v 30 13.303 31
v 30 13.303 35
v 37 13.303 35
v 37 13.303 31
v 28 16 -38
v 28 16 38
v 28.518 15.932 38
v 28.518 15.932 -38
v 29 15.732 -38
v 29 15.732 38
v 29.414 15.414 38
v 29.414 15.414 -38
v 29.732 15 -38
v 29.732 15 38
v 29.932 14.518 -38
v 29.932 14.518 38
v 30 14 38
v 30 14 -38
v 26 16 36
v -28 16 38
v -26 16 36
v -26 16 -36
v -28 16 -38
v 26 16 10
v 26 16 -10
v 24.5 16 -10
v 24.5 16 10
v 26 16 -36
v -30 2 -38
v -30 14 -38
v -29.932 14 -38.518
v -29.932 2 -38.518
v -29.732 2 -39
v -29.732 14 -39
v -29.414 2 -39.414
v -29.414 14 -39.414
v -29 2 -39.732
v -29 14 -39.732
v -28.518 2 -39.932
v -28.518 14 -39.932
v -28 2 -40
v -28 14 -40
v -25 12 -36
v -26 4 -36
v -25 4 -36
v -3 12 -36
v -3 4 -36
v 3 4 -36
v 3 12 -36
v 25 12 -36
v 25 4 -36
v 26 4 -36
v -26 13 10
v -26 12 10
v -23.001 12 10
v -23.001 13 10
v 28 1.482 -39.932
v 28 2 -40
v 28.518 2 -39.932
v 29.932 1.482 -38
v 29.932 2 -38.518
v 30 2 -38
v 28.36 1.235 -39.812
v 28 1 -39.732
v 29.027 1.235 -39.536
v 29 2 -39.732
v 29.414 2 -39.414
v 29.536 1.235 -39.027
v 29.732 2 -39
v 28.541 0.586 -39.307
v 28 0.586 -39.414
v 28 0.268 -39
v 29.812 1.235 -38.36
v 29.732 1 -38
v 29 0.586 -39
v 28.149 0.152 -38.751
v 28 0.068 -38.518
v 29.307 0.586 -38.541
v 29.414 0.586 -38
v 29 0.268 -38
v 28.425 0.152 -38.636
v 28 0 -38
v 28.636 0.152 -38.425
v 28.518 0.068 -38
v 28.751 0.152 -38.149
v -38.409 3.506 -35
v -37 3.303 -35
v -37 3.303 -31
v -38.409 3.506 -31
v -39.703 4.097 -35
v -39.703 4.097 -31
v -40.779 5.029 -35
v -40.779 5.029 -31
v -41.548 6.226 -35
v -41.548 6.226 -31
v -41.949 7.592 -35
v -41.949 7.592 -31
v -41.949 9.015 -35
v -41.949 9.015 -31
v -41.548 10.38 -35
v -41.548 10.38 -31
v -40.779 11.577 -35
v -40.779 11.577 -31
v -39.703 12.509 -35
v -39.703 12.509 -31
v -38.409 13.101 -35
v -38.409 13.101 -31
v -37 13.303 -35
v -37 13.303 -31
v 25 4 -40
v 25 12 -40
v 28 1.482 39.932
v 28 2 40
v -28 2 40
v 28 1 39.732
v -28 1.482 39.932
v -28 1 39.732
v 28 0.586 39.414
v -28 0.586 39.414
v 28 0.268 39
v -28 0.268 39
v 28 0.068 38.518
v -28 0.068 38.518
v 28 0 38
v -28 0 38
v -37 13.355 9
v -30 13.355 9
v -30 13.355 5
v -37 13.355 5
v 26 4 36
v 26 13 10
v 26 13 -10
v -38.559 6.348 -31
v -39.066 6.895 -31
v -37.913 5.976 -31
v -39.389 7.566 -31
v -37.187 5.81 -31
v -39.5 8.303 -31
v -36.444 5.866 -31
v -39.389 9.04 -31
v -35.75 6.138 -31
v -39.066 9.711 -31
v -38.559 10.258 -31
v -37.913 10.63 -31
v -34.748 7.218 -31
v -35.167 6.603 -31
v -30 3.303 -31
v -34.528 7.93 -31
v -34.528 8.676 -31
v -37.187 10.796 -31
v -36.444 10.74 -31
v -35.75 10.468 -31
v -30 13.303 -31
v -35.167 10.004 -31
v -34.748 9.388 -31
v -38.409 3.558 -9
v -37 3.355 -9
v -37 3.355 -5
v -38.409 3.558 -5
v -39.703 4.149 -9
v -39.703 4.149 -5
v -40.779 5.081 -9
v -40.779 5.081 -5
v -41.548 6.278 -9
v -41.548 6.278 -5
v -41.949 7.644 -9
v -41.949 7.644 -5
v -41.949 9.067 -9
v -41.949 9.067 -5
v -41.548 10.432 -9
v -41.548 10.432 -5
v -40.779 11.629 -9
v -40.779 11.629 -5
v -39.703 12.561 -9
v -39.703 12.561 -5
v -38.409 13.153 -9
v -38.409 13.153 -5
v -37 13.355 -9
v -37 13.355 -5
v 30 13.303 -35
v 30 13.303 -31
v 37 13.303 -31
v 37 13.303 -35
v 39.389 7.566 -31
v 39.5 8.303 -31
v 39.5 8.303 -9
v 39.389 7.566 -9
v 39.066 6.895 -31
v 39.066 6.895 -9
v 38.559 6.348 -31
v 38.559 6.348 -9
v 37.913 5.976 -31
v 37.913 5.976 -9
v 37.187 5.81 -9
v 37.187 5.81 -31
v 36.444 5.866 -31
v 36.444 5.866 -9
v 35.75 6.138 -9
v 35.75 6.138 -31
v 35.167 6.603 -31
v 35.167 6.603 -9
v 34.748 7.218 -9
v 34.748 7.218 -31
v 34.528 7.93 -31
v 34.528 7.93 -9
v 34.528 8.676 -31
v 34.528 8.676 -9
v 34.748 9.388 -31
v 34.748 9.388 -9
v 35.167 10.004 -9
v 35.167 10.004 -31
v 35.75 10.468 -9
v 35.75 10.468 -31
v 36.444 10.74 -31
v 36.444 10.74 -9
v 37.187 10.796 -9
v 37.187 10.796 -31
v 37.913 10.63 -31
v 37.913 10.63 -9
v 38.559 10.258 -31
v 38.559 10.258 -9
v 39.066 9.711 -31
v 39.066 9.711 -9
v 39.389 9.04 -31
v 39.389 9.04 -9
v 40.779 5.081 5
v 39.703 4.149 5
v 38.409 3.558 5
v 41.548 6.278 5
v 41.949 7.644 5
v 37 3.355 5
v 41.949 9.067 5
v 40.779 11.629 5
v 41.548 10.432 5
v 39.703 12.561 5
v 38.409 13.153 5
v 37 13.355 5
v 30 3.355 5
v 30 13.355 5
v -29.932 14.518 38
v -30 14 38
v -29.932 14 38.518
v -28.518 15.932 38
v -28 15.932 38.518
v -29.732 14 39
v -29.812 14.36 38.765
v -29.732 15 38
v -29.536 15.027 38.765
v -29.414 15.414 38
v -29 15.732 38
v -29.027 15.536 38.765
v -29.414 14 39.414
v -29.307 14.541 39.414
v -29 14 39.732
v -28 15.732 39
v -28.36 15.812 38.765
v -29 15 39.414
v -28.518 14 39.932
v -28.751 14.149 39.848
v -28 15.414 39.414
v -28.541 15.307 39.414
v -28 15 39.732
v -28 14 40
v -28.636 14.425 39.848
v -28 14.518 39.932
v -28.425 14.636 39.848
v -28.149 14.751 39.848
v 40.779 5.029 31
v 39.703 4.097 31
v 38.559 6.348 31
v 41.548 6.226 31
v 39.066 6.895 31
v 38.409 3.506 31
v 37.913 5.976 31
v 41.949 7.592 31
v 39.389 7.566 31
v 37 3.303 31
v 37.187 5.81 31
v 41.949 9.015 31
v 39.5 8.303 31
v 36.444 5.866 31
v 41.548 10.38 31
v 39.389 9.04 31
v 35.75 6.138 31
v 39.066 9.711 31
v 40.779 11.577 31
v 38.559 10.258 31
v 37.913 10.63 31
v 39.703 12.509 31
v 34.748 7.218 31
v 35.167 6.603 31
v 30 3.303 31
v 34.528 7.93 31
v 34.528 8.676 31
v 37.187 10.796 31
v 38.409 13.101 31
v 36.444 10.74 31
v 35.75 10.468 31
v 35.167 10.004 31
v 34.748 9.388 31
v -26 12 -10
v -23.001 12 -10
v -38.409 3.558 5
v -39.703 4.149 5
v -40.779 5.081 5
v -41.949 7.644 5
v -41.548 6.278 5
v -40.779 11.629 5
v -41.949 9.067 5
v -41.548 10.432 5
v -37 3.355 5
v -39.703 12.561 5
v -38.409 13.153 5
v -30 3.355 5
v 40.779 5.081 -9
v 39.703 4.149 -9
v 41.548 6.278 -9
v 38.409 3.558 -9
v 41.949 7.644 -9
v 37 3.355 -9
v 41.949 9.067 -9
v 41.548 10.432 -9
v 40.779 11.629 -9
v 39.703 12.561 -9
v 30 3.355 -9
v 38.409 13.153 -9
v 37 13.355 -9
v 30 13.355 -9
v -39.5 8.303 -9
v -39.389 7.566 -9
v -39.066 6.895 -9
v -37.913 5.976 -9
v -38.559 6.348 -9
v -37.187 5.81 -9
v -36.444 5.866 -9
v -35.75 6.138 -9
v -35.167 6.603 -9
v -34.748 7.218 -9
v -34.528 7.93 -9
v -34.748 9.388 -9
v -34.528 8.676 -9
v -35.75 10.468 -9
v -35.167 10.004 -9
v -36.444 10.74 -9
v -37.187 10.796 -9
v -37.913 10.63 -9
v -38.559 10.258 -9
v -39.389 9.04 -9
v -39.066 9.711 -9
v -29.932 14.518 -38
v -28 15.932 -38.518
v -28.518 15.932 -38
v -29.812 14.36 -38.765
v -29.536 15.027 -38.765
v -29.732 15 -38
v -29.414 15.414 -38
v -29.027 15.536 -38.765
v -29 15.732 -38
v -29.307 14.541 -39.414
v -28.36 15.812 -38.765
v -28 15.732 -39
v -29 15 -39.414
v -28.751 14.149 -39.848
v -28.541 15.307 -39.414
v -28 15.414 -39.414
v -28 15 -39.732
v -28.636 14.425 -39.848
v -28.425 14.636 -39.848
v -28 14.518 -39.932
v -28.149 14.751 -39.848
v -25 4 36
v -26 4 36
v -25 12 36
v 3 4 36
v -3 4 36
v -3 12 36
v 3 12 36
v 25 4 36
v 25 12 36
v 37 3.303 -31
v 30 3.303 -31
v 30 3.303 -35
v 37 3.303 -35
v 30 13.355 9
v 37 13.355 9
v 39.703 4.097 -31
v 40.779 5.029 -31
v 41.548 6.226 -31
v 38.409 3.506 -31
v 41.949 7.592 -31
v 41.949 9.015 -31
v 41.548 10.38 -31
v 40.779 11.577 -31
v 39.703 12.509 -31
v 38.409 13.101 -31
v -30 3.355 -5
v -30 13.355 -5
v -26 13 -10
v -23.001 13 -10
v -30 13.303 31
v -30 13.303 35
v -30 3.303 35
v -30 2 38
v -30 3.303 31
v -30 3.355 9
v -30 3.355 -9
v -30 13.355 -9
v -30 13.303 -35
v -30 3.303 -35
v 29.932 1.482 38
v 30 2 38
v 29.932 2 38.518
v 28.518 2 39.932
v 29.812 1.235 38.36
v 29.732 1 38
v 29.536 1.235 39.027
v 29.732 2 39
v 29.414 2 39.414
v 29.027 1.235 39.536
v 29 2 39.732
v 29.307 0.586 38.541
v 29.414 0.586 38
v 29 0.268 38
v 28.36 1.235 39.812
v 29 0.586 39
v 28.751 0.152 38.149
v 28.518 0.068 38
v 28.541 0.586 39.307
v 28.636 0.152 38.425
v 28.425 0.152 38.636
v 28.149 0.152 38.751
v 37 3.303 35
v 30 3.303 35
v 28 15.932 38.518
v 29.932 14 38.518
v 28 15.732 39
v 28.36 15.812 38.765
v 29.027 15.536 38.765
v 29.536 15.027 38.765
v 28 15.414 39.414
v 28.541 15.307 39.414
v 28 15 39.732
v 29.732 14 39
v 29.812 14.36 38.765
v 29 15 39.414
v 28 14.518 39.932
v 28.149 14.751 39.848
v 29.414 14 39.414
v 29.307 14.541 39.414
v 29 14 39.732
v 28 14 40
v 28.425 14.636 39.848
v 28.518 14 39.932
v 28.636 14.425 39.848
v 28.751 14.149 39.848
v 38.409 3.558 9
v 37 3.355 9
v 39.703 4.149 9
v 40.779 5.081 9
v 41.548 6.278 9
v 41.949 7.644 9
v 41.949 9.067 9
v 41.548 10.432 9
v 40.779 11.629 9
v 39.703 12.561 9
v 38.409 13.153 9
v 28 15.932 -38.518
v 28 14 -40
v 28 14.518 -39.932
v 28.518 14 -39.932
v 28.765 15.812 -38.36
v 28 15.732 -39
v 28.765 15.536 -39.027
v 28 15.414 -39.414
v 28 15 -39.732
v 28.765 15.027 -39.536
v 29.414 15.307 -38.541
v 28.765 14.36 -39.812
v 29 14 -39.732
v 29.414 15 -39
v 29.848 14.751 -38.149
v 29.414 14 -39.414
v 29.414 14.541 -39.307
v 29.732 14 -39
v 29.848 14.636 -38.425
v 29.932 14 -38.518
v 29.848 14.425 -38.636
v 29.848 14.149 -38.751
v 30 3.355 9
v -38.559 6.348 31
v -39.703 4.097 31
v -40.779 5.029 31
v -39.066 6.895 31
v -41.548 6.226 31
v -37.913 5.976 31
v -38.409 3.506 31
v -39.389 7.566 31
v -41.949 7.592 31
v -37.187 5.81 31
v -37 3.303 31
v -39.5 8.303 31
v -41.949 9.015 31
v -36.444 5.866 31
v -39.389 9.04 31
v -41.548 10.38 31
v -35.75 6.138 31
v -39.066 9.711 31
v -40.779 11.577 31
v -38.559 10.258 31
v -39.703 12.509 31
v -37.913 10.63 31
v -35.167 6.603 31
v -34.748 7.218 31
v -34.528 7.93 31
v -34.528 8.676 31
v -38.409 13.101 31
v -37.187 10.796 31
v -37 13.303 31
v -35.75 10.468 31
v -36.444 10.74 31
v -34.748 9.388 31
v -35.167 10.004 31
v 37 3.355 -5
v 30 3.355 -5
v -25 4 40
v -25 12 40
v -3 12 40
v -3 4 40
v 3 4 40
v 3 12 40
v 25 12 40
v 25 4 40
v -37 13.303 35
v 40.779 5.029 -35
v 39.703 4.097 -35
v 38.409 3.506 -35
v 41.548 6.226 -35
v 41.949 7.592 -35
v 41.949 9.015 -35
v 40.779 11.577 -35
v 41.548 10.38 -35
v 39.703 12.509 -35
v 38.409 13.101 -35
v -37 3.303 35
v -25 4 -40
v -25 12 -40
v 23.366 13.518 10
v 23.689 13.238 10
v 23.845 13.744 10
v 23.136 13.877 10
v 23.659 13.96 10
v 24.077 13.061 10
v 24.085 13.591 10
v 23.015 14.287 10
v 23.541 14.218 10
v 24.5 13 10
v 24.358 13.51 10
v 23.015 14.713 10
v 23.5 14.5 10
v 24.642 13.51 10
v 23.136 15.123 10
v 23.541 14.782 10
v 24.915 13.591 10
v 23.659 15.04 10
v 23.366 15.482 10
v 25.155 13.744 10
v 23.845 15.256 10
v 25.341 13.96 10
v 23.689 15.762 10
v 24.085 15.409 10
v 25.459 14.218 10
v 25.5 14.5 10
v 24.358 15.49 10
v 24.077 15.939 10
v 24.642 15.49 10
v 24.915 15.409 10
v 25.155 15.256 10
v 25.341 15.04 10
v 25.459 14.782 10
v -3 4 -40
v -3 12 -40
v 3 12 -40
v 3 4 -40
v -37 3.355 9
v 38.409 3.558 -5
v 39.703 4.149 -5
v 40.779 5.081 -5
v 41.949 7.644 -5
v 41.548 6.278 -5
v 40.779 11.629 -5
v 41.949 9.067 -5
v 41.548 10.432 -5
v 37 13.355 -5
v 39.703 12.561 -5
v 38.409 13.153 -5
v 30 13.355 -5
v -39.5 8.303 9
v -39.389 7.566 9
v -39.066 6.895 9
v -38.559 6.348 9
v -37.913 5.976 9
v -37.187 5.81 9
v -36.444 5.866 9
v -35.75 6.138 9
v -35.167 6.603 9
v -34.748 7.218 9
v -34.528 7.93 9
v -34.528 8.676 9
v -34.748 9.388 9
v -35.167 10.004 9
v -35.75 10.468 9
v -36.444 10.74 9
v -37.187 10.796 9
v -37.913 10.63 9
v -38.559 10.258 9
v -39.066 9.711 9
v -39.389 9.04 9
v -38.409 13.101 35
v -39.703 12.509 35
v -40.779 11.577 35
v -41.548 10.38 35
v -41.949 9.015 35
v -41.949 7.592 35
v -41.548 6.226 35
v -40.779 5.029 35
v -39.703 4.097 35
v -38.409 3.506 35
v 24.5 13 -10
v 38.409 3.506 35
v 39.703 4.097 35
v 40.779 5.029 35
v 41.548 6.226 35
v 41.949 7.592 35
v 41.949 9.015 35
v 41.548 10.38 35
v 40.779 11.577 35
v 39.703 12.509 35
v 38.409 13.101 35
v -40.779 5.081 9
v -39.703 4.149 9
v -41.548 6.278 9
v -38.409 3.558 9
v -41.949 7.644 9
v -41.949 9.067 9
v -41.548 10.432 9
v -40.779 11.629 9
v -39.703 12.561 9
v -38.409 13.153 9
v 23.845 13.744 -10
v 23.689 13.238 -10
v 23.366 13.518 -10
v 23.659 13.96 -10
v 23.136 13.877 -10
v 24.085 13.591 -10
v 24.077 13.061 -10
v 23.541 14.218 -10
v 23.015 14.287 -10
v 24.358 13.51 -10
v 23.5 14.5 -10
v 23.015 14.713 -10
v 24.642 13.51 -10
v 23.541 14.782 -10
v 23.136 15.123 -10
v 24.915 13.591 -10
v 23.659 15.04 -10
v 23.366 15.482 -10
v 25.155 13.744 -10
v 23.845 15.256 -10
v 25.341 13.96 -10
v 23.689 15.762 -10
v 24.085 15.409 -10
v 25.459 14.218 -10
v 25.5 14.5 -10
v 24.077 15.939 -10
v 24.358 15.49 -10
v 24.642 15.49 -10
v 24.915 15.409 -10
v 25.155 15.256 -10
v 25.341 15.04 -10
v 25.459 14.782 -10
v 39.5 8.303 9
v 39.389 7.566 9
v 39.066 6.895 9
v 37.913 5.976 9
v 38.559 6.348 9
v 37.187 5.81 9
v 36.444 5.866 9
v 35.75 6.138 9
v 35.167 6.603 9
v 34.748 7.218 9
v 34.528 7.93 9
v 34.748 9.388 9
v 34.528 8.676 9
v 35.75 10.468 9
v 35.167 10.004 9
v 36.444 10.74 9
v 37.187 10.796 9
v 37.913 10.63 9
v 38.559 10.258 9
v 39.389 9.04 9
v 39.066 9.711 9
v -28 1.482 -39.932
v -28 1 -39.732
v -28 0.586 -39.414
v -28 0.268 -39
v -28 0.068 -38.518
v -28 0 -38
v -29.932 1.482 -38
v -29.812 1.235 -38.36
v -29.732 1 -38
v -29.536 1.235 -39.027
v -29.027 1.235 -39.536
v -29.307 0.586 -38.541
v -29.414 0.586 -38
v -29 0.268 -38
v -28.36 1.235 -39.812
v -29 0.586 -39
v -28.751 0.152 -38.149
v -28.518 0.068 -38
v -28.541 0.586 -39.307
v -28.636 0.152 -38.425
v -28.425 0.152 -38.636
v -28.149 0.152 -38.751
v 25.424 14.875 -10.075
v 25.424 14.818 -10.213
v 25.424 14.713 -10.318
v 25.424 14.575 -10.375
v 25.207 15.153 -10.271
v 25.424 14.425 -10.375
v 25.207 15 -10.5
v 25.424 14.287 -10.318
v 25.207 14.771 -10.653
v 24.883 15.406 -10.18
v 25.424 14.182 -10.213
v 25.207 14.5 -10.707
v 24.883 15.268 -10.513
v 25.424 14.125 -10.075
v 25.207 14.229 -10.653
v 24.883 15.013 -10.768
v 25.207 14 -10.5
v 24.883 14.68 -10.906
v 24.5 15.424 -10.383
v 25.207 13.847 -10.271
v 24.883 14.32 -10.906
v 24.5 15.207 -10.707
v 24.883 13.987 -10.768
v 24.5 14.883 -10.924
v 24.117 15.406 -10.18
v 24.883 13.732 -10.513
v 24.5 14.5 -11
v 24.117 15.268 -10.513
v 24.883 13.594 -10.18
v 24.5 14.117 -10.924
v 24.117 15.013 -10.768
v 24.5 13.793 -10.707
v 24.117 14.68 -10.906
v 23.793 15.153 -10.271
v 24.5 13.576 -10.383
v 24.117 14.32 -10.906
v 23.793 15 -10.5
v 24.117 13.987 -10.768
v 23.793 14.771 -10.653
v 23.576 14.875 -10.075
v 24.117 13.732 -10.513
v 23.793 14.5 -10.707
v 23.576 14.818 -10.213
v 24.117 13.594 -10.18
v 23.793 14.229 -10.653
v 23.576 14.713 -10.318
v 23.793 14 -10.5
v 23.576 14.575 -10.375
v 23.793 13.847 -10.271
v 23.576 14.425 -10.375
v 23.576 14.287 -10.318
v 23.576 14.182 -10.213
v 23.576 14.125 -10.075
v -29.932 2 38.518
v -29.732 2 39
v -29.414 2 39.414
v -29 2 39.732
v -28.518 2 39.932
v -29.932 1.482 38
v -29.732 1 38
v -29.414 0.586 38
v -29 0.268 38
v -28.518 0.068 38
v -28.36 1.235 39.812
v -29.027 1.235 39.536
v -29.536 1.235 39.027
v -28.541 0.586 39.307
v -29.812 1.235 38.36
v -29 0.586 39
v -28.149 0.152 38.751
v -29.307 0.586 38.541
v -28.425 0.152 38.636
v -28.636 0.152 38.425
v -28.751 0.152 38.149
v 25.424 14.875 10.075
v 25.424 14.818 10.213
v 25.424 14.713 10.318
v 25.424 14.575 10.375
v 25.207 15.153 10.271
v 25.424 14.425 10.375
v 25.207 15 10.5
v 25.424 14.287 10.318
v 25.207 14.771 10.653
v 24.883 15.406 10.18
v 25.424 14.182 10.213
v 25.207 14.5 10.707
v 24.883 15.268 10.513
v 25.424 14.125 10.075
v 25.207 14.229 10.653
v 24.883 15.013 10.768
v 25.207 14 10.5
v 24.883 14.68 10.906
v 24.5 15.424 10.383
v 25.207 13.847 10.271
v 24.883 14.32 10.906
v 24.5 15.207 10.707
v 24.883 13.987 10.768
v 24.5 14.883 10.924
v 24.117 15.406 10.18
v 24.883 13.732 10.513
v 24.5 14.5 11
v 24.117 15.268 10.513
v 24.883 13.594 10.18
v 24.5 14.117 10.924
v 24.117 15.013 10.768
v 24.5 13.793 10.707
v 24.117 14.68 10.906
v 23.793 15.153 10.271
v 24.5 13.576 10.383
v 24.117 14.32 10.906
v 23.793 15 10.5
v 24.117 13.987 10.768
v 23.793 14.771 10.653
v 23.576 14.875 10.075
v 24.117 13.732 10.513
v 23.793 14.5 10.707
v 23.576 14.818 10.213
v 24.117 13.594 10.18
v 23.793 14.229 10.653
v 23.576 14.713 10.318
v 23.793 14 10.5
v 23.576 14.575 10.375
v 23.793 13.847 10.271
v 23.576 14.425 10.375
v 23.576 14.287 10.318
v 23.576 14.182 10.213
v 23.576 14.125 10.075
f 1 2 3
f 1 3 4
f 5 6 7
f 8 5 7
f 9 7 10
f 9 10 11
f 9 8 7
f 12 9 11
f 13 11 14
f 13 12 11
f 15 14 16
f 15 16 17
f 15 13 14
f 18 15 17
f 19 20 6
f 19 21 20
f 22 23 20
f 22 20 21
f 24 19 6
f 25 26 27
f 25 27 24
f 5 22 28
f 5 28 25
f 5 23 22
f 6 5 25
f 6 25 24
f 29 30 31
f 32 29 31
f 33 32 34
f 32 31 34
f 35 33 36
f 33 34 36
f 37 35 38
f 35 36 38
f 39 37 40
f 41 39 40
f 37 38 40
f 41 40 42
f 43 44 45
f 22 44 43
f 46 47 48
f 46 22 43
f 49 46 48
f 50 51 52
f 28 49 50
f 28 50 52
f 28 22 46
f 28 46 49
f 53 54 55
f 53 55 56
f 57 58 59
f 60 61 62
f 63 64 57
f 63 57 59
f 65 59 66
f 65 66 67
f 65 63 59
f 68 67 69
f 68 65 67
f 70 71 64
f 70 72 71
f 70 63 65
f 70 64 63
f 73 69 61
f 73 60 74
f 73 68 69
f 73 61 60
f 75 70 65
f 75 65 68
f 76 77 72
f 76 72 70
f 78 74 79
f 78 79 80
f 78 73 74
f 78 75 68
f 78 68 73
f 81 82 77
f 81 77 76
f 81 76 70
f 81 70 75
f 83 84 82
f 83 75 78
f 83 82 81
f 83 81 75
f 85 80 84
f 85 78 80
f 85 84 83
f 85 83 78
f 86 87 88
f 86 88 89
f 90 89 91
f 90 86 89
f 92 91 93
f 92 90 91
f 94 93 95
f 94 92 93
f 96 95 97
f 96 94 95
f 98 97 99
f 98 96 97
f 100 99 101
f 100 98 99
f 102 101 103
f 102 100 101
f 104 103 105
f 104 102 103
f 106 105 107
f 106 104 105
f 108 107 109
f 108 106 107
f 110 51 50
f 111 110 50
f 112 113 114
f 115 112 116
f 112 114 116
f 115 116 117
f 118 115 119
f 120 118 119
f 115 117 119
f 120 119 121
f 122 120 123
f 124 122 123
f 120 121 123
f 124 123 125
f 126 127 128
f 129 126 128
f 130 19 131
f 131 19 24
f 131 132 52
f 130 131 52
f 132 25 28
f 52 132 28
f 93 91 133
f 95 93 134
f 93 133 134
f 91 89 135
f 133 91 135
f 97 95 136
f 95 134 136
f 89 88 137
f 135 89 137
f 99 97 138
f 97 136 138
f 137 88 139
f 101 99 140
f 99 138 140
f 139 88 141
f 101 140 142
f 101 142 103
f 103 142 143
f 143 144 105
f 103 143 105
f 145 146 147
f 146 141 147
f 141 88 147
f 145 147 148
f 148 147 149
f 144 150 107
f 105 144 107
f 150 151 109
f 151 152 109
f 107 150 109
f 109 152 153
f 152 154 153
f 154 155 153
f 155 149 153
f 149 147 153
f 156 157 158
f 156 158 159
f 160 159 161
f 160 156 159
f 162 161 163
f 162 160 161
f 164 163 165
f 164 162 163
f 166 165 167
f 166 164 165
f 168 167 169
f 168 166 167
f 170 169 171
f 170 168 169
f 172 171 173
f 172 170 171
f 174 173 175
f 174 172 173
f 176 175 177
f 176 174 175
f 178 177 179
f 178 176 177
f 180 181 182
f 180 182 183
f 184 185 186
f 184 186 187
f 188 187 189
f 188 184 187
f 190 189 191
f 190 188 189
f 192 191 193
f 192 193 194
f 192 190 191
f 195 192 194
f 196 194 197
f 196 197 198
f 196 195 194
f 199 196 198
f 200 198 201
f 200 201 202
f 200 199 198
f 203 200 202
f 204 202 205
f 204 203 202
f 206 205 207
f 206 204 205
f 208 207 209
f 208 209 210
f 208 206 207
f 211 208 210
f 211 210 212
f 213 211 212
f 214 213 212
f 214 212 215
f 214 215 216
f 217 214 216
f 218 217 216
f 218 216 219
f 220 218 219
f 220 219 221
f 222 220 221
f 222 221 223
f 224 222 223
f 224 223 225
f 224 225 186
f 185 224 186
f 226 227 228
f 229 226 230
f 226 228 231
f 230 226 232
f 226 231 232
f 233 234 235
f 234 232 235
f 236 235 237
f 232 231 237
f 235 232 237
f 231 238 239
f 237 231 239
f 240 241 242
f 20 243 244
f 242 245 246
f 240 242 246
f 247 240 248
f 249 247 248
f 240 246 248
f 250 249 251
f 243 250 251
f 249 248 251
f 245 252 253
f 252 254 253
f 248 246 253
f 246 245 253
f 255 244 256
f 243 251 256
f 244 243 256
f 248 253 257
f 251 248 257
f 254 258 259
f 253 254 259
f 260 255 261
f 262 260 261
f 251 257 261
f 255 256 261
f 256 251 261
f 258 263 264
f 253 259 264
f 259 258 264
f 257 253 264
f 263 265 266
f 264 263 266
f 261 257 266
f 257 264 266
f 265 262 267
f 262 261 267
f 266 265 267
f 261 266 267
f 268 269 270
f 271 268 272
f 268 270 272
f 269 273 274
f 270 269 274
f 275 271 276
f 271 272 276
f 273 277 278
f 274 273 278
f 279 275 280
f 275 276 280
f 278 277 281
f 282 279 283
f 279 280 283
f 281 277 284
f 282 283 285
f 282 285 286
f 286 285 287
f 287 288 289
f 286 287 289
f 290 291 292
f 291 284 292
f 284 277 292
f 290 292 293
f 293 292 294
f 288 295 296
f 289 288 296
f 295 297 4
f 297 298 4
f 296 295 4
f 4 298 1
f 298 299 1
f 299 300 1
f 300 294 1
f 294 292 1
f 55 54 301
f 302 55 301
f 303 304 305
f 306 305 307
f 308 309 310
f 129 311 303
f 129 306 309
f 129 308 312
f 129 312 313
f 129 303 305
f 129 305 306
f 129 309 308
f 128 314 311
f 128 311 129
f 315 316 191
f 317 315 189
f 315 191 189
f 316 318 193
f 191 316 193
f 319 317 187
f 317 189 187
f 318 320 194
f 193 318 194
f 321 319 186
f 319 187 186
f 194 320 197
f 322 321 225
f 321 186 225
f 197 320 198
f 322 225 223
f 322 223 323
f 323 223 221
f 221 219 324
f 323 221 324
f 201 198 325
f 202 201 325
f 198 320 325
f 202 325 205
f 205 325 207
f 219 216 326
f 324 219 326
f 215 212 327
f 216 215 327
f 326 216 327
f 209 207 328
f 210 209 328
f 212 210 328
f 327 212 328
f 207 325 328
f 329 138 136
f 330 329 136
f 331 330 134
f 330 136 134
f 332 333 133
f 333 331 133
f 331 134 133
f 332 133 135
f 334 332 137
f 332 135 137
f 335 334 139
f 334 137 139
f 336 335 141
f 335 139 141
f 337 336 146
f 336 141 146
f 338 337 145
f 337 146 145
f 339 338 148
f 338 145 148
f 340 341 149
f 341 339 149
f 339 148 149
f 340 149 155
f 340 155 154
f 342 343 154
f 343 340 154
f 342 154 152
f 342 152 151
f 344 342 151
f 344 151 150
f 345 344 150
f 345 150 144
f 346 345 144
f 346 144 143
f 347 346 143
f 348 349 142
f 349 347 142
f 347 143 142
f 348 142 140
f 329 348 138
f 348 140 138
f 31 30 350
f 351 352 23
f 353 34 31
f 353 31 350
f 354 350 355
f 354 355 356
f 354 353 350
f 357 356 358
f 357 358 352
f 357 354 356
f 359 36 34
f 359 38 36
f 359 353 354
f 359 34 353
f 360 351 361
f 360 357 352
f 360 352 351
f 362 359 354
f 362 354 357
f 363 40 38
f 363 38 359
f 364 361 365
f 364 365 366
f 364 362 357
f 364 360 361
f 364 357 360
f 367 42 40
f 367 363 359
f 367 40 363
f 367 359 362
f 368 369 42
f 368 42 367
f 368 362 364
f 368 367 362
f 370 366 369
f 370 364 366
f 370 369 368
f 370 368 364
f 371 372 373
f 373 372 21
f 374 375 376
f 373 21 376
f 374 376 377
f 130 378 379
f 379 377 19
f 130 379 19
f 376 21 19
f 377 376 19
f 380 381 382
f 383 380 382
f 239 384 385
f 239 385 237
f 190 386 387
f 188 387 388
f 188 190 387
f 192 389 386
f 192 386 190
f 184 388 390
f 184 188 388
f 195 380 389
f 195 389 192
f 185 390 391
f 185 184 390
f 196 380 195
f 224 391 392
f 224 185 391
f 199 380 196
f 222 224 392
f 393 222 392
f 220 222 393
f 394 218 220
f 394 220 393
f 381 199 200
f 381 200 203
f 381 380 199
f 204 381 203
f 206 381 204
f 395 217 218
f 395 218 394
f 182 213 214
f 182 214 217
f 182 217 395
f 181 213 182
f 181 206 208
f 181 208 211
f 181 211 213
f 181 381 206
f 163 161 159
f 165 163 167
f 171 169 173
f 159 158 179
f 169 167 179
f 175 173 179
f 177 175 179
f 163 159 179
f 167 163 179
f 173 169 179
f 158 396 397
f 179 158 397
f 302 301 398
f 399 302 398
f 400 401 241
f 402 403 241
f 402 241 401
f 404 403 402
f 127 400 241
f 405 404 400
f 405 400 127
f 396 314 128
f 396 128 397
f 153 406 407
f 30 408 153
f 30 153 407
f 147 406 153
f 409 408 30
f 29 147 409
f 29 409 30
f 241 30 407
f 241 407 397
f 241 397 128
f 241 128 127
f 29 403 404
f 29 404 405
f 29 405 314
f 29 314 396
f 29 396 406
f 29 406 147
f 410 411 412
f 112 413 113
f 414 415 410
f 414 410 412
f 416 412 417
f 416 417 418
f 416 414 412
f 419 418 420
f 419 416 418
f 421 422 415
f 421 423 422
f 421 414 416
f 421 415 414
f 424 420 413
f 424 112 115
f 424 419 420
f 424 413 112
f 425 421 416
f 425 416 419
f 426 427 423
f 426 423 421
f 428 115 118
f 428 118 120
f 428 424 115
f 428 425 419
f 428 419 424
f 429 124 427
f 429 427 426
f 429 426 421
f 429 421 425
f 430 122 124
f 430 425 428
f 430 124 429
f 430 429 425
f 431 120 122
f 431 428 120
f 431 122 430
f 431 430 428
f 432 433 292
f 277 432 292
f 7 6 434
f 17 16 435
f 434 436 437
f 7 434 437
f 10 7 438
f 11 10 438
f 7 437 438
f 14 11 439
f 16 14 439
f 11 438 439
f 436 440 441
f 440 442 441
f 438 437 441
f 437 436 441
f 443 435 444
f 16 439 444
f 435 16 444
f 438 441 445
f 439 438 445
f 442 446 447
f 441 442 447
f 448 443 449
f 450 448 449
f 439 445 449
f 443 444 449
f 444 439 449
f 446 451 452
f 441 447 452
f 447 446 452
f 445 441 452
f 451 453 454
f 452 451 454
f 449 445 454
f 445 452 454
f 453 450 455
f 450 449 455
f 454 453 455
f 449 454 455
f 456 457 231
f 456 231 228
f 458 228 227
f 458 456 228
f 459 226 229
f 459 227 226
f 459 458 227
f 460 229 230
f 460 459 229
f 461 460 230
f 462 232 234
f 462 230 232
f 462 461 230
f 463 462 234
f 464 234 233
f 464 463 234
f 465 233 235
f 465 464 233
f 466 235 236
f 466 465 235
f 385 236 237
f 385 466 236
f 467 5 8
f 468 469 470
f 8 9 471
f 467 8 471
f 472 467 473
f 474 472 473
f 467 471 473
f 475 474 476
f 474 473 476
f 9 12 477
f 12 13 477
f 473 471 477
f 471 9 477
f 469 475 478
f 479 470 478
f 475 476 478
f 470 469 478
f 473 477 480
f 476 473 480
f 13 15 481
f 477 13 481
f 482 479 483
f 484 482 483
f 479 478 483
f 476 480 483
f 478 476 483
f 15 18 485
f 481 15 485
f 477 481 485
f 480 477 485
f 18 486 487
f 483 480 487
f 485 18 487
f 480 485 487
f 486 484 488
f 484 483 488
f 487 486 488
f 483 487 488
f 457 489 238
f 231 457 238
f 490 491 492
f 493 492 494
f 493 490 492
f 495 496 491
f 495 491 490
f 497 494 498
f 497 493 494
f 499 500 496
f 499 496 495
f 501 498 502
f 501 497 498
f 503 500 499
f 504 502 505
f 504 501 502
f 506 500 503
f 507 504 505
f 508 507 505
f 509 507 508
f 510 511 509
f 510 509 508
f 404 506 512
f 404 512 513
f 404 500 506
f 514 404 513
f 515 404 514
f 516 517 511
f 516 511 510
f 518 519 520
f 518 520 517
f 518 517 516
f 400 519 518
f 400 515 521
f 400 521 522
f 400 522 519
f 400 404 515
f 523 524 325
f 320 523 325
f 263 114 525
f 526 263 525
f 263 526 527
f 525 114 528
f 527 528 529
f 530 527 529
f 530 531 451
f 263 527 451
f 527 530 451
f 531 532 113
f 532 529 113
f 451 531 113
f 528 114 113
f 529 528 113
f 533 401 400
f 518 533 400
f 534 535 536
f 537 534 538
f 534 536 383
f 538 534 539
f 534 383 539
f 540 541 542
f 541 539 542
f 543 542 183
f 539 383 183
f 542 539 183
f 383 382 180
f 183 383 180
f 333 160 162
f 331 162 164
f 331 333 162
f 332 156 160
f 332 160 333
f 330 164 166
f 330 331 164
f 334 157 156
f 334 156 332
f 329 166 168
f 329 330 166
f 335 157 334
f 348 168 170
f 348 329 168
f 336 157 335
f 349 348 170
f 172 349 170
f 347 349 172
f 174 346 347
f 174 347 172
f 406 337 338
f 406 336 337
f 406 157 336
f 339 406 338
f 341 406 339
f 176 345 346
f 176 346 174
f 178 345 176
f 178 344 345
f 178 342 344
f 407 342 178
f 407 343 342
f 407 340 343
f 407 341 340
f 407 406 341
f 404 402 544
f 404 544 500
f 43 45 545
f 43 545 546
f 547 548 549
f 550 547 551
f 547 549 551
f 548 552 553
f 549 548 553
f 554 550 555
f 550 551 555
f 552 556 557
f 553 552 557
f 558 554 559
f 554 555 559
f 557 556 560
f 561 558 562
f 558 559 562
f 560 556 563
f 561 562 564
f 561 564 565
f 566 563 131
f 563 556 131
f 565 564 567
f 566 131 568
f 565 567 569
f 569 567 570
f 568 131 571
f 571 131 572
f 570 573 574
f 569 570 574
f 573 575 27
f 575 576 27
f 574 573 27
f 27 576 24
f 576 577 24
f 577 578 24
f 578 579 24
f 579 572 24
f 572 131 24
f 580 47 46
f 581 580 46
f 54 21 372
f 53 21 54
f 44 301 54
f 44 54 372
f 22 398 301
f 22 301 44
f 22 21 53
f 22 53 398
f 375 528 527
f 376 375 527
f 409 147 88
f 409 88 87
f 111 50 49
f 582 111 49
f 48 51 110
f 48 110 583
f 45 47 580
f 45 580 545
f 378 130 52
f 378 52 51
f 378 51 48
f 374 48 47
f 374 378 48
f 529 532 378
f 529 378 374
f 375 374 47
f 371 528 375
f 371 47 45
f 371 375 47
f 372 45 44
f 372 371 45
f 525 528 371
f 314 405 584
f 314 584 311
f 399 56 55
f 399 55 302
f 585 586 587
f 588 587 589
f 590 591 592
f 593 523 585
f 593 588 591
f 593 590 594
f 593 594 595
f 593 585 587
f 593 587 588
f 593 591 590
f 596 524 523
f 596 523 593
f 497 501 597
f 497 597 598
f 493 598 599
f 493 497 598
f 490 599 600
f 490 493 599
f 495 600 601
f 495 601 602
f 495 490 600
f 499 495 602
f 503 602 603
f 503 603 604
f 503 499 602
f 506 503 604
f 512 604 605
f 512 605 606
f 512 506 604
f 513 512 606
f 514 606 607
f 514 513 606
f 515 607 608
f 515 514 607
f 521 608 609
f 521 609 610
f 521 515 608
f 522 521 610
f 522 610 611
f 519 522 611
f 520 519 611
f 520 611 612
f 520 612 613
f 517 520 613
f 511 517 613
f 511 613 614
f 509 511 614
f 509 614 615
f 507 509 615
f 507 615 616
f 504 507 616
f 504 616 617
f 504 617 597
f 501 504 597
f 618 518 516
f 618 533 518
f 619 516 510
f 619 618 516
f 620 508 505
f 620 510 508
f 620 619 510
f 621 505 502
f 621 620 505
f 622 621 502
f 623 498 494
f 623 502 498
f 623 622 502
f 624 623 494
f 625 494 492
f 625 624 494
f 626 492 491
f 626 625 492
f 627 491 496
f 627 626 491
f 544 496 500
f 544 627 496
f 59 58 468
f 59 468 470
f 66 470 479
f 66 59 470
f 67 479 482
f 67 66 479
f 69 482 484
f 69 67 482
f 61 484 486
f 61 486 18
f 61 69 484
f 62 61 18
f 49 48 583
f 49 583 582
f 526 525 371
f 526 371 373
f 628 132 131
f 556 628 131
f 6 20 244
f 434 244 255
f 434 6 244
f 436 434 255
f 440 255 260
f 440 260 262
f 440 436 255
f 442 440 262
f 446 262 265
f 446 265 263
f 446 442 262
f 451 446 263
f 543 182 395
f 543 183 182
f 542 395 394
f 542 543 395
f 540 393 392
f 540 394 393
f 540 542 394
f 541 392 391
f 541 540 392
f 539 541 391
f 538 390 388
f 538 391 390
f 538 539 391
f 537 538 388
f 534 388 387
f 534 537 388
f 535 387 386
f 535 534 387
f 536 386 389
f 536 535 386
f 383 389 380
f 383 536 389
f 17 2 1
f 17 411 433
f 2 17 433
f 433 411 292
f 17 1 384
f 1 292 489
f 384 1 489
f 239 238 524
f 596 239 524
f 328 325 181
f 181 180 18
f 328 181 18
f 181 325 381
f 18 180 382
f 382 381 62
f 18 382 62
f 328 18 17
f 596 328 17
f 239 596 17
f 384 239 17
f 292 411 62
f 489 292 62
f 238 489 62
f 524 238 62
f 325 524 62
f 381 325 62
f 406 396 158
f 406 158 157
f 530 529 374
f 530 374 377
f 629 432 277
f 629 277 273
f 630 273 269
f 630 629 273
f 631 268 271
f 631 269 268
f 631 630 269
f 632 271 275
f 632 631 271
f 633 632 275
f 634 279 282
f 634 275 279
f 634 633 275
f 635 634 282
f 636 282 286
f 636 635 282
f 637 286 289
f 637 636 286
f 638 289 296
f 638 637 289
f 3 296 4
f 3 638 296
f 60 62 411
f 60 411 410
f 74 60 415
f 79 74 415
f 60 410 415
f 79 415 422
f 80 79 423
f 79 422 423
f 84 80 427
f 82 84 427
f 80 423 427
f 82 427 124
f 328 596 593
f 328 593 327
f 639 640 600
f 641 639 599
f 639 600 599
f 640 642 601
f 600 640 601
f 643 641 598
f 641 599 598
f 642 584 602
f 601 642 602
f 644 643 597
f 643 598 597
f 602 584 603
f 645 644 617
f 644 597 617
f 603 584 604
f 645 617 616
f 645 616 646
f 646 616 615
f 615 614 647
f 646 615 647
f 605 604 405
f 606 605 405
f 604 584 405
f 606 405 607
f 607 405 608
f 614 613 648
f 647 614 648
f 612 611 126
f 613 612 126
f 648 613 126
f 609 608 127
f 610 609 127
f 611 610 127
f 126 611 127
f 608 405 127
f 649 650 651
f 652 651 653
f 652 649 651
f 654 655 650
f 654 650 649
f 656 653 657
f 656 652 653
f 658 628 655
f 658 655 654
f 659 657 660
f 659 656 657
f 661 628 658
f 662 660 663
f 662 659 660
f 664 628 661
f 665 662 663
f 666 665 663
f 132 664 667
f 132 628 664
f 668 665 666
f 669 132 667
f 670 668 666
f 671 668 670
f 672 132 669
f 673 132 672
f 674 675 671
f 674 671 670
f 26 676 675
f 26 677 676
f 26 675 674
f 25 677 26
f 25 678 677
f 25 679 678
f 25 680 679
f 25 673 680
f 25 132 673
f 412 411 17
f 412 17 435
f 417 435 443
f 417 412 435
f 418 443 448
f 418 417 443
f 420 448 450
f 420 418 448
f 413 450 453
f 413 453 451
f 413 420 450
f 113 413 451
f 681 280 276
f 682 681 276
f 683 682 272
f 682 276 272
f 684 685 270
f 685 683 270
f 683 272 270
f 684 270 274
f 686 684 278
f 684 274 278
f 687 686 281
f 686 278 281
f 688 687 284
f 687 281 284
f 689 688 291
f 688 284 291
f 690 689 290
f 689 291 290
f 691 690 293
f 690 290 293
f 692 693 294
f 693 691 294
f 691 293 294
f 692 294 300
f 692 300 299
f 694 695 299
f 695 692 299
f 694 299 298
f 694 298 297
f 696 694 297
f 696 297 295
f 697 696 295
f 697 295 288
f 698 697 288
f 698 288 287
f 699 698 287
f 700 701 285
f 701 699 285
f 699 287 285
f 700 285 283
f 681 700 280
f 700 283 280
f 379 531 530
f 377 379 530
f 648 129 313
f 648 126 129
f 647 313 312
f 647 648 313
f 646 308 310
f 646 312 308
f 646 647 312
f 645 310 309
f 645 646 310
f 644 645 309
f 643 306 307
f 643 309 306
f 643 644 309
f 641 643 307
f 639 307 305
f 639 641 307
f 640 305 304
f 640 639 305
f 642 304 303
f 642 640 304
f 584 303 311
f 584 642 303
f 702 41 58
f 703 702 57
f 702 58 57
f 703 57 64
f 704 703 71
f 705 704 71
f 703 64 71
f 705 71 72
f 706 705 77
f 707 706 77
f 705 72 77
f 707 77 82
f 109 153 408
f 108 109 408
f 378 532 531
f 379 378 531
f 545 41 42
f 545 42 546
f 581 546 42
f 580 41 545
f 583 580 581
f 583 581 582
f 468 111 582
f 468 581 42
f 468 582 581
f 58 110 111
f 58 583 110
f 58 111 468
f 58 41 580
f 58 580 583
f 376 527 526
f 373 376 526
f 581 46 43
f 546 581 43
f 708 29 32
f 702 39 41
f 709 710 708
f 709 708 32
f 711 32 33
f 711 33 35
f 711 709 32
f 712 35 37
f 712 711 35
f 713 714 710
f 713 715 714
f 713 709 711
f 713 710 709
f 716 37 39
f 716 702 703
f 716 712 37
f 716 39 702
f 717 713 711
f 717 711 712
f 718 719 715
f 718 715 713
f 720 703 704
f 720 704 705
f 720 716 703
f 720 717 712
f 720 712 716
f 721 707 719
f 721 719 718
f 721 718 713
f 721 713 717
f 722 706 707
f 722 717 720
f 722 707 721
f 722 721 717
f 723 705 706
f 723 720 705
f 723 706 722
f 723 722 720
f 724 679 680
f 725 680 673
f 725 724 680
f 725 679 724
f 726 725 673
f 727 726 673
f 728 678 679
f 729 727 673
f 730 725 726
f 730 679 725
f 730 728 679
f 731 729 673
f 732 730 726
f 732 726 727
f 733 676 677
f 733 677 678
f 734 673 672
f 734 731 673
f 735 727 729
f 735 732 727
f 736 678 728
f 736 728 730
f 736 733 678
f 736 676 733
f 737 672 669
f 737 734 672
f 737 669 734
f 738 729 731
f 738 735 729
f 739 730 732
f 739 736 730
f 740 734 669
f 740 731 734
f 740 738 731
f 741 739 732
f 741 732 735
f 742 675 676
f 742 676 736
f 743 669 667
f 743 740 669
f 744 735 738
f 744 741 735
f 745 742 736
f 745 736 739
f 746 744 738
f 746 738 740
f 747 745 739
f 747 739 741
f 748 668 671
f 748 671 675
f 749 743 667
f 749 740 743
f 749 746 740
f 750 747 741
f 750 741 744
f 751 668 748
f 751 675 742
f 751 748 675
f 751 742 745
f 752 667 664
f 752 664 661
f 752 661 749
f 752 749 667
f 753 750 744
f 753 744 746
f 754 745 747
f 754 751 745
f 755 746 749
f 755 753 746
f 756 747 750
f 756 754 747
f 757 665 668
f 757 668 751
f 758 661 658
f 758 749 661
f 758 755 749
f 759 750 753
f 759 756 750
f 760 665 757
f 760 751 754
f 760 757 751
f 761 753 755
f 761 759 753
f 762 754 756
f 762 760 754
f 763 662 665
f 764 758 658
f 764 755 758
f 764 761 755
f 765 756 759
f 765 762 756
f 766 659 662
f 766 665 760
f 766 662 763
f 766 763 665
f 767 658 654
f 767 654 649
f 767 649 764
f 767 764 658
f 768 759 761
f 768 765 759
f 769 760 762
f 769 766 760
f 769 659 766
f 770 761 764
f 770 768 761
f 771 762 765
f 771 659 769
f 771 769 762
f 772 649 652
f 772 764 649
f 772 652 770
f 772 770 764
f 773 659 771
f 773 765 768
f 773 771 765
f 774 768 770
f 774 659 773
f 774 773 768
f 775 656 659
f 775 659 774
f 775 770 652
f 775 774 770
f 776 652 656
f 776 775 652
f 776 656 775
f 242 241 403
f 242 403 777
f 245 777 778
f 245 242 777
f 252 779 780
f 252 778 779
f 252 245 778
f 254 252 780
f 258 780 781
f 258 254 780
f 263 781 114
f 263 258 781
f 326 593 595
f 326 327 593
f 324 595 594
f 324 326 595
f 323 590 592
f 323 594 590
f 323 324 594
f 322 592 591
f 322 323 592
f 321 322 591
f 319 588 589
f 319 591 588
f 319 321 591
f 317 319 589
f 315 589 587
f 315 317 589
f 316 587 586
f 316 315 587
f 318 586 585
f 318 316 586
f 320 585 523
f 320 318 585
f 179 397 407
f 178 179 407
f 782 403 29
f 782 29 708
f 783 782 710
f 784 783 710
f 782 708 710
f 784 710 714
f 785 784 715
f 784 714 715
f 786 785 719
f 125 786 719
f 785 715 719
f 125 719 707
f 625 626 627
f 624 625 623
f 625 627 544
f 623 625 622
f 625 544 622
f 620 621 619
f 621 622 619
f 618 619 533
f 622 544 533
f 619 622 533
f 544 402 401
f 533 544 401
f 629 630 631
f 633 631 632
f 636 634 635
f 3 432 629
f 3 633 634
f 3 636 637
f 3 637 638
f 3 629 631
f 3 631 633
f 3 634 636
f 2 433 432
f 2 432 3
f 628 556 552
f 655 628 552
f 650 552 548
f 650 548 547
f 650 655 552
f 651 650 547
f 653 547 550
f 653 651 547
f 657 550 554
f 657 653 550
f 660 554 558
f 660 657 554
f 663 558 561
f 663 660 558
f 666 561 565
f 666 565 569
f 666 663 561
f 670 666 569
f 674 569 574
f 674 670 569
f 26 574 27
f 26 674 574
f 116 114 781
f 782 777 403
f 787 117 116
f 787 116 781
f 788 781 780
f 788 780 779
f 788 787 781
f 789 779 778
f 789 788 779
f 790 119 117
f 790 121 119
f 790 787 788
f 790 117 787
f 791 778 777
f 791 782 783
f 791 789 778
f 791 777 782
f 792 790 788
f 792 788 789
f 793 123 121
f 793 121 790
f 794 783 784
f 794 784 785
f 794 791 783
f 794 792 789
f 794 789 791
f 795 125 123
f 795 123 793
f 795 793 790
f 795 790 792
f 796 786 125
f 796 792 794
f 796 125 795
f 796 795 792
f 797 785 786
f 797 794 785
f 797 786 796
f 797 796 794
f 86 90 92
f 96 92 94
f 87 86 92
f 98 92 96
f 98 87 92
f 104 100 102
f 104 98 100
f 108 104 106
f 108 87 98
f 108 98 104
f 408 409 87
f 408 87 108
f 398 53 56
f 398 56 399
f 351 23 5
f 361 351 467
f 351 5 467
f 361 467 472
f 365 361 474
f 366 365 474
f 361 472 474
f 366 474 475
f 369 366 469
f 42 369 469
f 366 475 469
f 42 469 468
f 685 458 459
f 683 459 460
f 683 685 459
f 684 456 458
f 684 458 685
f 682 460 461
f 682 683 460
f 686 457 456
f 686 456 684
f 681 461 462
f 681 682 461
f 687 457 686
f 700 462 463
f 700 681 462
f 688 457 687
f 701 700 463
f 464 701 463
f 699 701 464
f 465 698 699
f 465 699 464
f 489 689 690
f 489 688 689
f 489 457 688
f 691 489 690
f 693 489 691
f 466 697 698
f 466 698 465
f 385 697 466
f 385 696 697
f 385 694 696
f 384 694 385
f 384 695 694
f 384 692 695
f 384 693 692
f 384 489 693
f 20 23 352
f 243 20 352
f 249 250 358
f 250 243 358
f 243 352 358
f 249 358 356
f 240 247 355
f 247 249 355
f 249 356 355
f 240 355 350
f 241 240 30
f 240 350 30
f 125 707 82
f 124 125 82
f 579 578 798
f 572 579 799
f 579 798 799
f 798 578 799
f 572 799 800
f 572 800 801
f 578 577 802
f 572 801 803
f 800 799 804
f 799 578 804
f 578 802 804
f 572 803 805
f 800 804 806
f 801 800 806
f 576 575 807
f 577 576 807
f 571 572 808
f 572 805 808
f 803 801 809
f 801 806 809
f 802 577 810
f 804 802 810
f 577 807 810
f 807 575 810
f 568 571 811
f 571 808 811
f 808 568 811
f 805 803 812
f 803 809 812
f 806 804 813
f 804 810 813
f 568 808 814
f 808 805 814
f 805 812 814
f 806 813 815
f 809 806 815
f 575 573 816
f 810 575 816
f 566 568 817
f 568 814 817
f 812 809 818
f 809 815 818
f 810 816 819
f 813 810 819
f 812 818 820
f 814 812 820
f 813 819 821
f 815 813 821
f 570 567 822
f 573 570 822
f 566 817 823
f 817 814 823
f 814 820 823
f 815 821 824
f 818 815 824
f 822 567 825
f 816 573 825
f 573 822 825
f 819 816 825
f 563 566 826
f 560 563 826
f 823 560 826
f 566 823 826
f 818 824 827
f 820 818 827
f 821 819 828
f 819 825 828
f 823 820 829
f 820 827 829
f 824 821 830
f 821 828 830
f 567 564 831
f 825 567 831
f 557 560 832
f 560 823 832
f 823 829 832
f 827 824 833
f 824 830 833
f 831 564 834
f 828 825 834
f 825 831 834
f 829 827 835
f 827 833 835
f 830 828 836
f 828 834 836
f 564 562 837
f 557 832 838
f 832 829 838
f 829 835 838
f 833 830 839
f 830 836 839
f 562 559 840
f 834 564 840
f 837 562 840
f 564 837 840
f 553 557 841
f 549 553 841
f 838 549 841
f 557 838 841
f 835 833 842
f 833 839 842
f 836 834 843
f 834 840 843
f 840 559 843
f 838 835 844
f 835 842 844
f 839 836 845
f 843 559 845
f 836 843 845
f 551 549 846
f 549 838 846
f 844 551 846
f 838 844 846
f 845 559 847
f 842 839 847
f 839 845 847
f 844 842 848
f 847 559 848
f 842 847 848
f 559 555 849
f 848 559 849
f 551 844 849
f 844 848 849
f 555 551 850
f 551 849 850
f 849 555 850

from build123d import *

# Parameters (mm, degrees)
SKETCH2_W                   = 60
SKETCH2_H                   = 80
BOSS_EXTRUDE2_DEPTH         = 16
SKETCH6_W                   = 52
SKETCH6_H                   = 72
CUT_EXTRUDE1_DEPTH          = 12
CUT_EXTRUDE2_DEPTH          = 16
CUT_EXTRUDE2_DEPTH_BACK     = 106
SKETCH7_W                   = 22
SKETCH7_H                   = 8
SKETCH8_W                   = 4
SKETCH8_H                   = 10
BOSS_EXTRUDE3_DEPTH         = 12
FILLET1_RADIUS              = 5
FILLET1_LENGTH              = 4
FILLET2_RADIUS              = 5
FILLET2_LENGTH              = 4
FILLET3_RADIUS              = 5
FILLET3_LENGTH              = 4
FILLET4_RADIUS              = 5
FILLET4_LENGTH              = 4
BOSS_EXTRUDE4_START         = -2
SKETCH9_R                   = 2.5
BOSS_EXTRUDE4_DEPTH         = 26
MIRROR2_START               = -2
MIRROR2_COPY_1_SKETCH_R     = 2.5
MIRROR2_COPY_1_DEPTH        = 26
FILLET1_OF_MIRROR2_2_RADIUS = 5
FILLET1_OF_MIRROR2_2_LENGTH = 4
FILLET2_OF_MIRROR2_2_RADIUS = 5
FILLET2_OF_MIRROR2_2_LENGTH = 4
FILLET3_OF_MIRROR2_2_RADIUS = 5
FILLET3_OF_MIRROR2_2_LENGTH = 4
FILLET4_OF_MIRROR2_2_RADIUS = 5
FILLET4_OF_MIRROR2_2_LENGTH = 4
SKETCH10_W                  = 20
SKETCH10_H                  = 1
BOSS_EXTRUDE5_DEPTH         = 2.999340988
SKETCH12_W                  = 20
SKETCH12_H                  = 3
BOSS_EXTRUDE6_DEPTH         = 3
FILLET6_RADIUS              = 1.5
FILLET6_LENGTH              = 20
FILLET7_R                   = 2
FILLET8_R                   = 2
FILLET9_R                   = 2
FILLET10_R                  = 2
FILLET11_R                  = 2


with BuildPart() as part:
    # Sketch2 → Boss-Extrude2 (new body)
    with BuildSketch(Plane(origin=(0, 0, 0), x_dir=(1, 0, 0), z_dir=(0, 1, 0))):
        Rectangle(SKETCH2_W, SKETCH2_H)
    extrude(amount=BOSS_EXTRUDE2_DEPTH)

    # Sketch6 → Cut-Extrude1 (cut)
    with BuildSketch(Plane(origin=(0, 16, 0), x_dir=(1, 0, 0), z_dir=(0, 1, 0))):
        Rectangle(SKETCH6_W, SKETCH6_H)
    extrude(amount=-CUT_EXTRUDE1_DEPTH, mode=Mode.SUBTRACT)

    # Sketch7 → Cut-Extrude2 (cut, two sides: drawn at the far end of the back side and taken through both)
    with BuildSketch(Plane(origin=(0, 0, -40), x_dir=(-1, 0, 0), z_dir=(0, 0, -1)).offset(-CUT_EXTRUDE2_DEPTH_BACK)):
        with Locations((-14, 8)):
            Rectangle(SKETCH7_W, SKETCH7_H)
        with Locations((14, 8)):
            Rectangle(SKETCH7_W, SKETCH7_H)
    extrude(amount=CUT_EXTRUDE2_DEPTH + CUT_EXTRUDE2_DEPTH_BACK, mode=Mode.SUBTRACT)

    # Sketch8 → Boss-Extrude3 (add)
    with BuildSketch(Plane(origin=(30, 0, 0), x_dir=(0, 0, -1), z_dir=(1, 0, 0))):
        with Locations((-33, 8.303078398)):
            Rectangle(SKETCH8_W, SKETCH8_H)
        with Locations((-7, 8.355173675)):
            Rectangle(SKETCH8_W, SKETCH8_H)
        with Locations((7, 8.355173675)):
            Rectangle(SKETCH8_W, SKETCH8_H)
        with Locations((33, 8.303078398)):
            Rectangle(SKETCH8_W, SKETCH8_H)
    boss_extrude3 = extrude(amount=BOSS_EXTRUDE3_DEPTH)

    # Fillet1: full round fillet: the end face becomes a half cylinder, R = half its width
    fillet1_face = Plane((42, 8.303078398, 33), x_dir=(0, 0, 1), z_dir=(1, 0, 0))  # on the end face: x along it, z out of the body
    fillet1_slab = fillet1_face.offset(-FILLET1_RADIUS / 2) * Box(FILLET1_LENGTH, 2 * FILLET1_RADIUS, FILLET1_RADIUS, mode=Mode.PRIVATE)  # the body's end, R deep
    fillet1_round = Plane((37, 8.303078398, 33), x_dir=(1, 0, 0), z_dir=(0, 0, 1)) * Cylinder(FILLET1_RADIUS, FILLET1_LENGTH, mode=Mode.PRIVATE)  # its axis R under the face
    add(fillet1_slab - fillet1_round, mode=Mode.SUBTRACT)

    # Fillet2: full round fillet: the end face becomes a half cylinder, R = half its width
    fillet2_face = Plane((42, 8.355173675, 7), x_dir=(0, 0, 1), z_dir=(1, 0, 0))  # on the end face: x along it, z out of the body
    fillet2_slab = fillet2_face.offset(-FILLET2_RADIUS / 2) * Box(FILLET2_LENGTH, 2 * FILLET2_RADIUS, FILLET2_RADIUS, mode=Mode.PRIVATE)  # the body's end, R deep
    fillet2_round = Plane((37, 8.355173675, 7), x_dir=(1, 0, 0), z_dir=(0, 0, 1)) * Cylinder(FILLET2_RADIUS, FILLET2_LENGTH, mode=Mode.PRIVATE)  # its axis R under the face
    add(fillet2_slab - fillet2_round, mode=Mode.SUBTRACT)

    # Fillet3: full round fillet: the end face becomes a half cylinder, R = half its width
    fillet3_face = Plane((42, 8.355173675, -7), x_dir=(0, 0, -1), z_dir=(1, 0, 0))  # on the end face: x along it, z out of the body
    fillet3_slab = fillet3_face.offset(-FILLET3_RADIUS / 2) * Box(FILLET3_LENGTH, 2 * FILLET3_RADIUS, FILLET3_RADIUS, mode=Mode.PRIVATE)  # the body's end, R deep
    fillet3_round = Plane((37, 8.355173675, -7), x_dir=(1, 0, 0), z_dir=(0, 0, -1)) * Cylinder(FILLET3_RADIUS, FILLET3_LENGTH, mode=Mode.PRIVATE)  # its axis R under the face
    add(fillet3_slab - fillet3_round, mode=Mode.SUBTRACT)

    # Fillet4: full round fillet: the end face becomes a half cylinder, R = half its width
    fillet4_face = Plane((42, 8.303078398, -33), x_dir=(0, 0, -1), z_dir=(1, 0, 0))  # on the end face: x along it, z out of the body
    fillet4_slab = fillet4_face.offset(-FILLET4_RADIUS / 2) * Box(FILLET4_LENGTH, 2 * FILLET4_RADIUS, FILLET4_RADIUS, mode=Mode.PRIVATE)  # the body's end, R deep
    fillet4_round = Plane((37, 8.303078398, -33), x_dir=(1, 0, 0), z_dir=(0, 0, -1)) * Cylinder(FILLET4_RADIUS, FILLET4_LENGTH, mode=Mode.PRIVATE)  # its axis R under the face
    add(fillet4_slab - fillet4_round, mode=Mode.SUBTRACT)

    # Sketch9 → Boss-Extrude4 (add)
    with BuildSketch(Plane(origin=(0, 0, 31), x_dir=(-1, 0, 0), z_dir=(0, 0, -1)).offset(BOSS_EXTRUDE4_START)):
        with Locations(Location((-37, 8.303078398, 0), (0, 0, 180))):
            Circle(SKETCH9_R)
    boss_extrude4 = extrude(amount=BOSS_EXTRUDE4_DEPTH)

    # Mirror1: Boss-Extrude4 across plane
    add(boss_extrude4.mirror(Plane(origin=(0, 0, 0), x_dir=(1, 0, 0), z_dir=(0, 0, -1))))

    # Mirror2: Boss-Extrude3, Boss-Extrude4 across plane
    add(boss_extrude3.mirror(Plane(origin=(0, 0, 0), x_dir=(0, 0, 1), z_dir=(1, 0, 0))))
    add(boss_extrude4.mirror(Plane(origin=(0, 0, 0), x_dir=(0, 0, 1), z_dir=(1, 0, 0))))

    # Mirror2 copy 1 sketch → Mirror2 copy 1 (add)
    with BuildSketch(Plane.XY.offset(-31).offset(MIRROR2_START)):
        with Locations(Location((-37, 8.303078398, 0), (0, 0, 180))):
            Circle(MIRROR2_COPY_1_SKETCH_R)
    extrude(amount=MIRROR2_COPY_1_DEPTH)

    # Fillet1 of Mirror2 2: full round fillet: the end face becomes a half cylinder, R = half its width
    fillet1_of_mirror2_2_face = Plane((-42, 8.303078398, 33), x_dir=(0, 0, 1), z_dir=(-1, 0, 0))  # on the end face: x along it, z out of the body
    fillet1_of_mirror2_2_slab = fillet1_of_mirror2_2_face.offset(-FILLET1_OF_MIRROR2_2_RADIUS / 2) * Box(FILLET1_OF_MIRROR2_2_LENGTH, 2 * FILLET1_OF_MIRROR2_2_RADIUS, FILLET1_OF_MIRROR2_2_RADIUS, mode=Mode.PRIVATE)  # the body's end, R deep
    fillet1_of_mirror2_2_round = Plane((-37, 8.303078398, 33), x_dir=(-1, 0, 0), z_dir=(0, 0, 1)) * Cylinder(FILLET1_OF_MIRROR2_2_RADIUS, FILLET1_OF_MIRROR2_2_LENGTH, mode=Mode.PRIVATE)  # its axis R under the face
    add(fillet1_of_mirror2_2_slab - fillet1_of_mirror2_2_round, mode=Mode.SUBTRACT)

    # Fillet2 of Mirror2 2: full round fillet: the end face becomes a half cylinder, R = half its width
    fillet2_of_mirror2_2_face = Plane((-42, 8.355173675, 7), x_dir=(0, 0, 1), z_dir=(-1, 0, 0))  # on the end face: x along it, z out of the body
    fillet2_of_mirror2_2_slab = fillet2_of_mirror2_2_face.offset(-FILLET2_OF_MIRROR2_2_RADIUS / 2) * Box(FILLET2_OF_MIRROR2_2_LENGTH, 2 * FILLET2_OF_MIRROR2_2_RADIUS, FILLET2_OF_MIRROR2_2_RADIUS, mode=Mode.PRIVATE)  # the body's end, R deep
    fillet2_of_mirror2_2_round = Plane((-37, 8.355173675, 7), x_dir=(-1, 0, 0), z_dir=(0, 0, 1)) * Cylinder(FILLET2_OF_MIRROR2_2_RADIUS, FILLET2_OF_MIRROR2_2_LENGTH, mode=Mode.PRIVATE)  # its axis R under the face
    add(fillet2_of_mirror2_2_slab - fillet2_of_mirror2_2_round, mode=Mode.SUBTRACT)

    # Fillet3 of Mirror2 2: full round fillet: the end face becomes a half cylinder, R = half its width
    fillet3_of_mirror2_2_face = Plane((-42, 8.355173675, -7), x_dir=(0, 0, -1), z_dir=(-1, 0, 0))  # on the end face: x along it, z out of the body
    fillet3_of_mirror2_2_slab = fillet3_of_mirror2_2_face.offset(-FILLET3_OF_MIRROR2_2_RADIUS / 2) * Box(FILLET3_OF_MIRROR2_2_LENGTH, 2 * FILLET3_OF_MIRROR2_2_RADIUS, FILLET3_OF_MIRROR2_2_RADIUS, mode=Mode.PRIVATE)  # the body's end, R deep
    fillet3_of_mirror2_2_round = Plane((-37, 8.355173675, -7), x_dir=(-1, 0, 0), z_dir=(0, 0, -1)) * Cylinder(FILLET3_OF_MIRROR2_2_RADIUS, FILLET3_OF_MIRROR2_2_LENGTH, mode=Mode.PRIVATE)  # its axis R under the face
    add(fillet3_of_mirror2_2_slab - fillet3_of_mirror2_2_round, mode=Mode.SUBTRACT)

    # Fillet4 of Mirror2 2: full round fillet: the end face becomes a half cylinder, R = half its width
    fillet4_of_mirror2_2_face = Plane((-42, 8.303078398, -33), x_dir=(0, 0, -1), z_dir=(-1, 0, 0))  # on the end face: x along it, z out of the body
    fillet4_of_mirror2_2_slab = fillet4_of_mirror2_2_face.offset(-FILLET4_OF_MIRROR2_2_RADIUS / 2) * Box(FILLET4_OF_MIRROR2_2_LENGTH, 2 * FILLET4_OF_MIRROR2_2_RADIUS, FILLET4_OF_MIRROR2_2_RADIUS, mode=Mode.PRIVATE)  # the body's end, R deep
    fillet4_of_mirror2_2_round = Plane((-37, 8.303078398, -33), x_dir=(-1, 0, 0), z_dir=(0, 0, -1)) * Cylinder(FILLET4_OF_MIRROR2_2_RADIUS, FILLET4_OF_MIRROR2_2_LENGTH, mode=Mode.PRIVATE)  # its axis R under the face
    add(fillet4_of_mirror2_2_slab - fillet4_of_mirror2_2_round, mode=Mode.SUBTRACT)

    # Sketch10 → Boss-Extrude5 (add)
    with BuildSketch(Plane(origin=(-26, 0, 0), x_dir=(0, 0, -1), z_dir=(1, 0, 0))):
        with Locations((0, 12.5)):
            Rectangle(SKETCH10_W, SKETCH10_H)
    extrude(amount=BOSS_EXTRUDE5_DEPTH)

    # Sketch12 → Boss-Extrude6 (add)
    with BuildSketch(Plane.ZY.offset(-26)):
        with Locations((0, 14.5)):
            Rectangle(SKETCH12_W, SKETCH12_H)
    extrude(amount=BOSS_EXTRUDE6_DEPTH)

    # Sketch13 → Revolve1 (revolve)
    with BuildSketch(Plane.XY.offset(10)):
        with BuildLine():
            Line((23.50027011, 14.5), (25.49972989, 14.5))
            ThreePointArc((25.49972989, 14.5), (24.5, 13.50027011), (23.50027011, 14.5))
        make_face()
    revolve1 = revolve(axis=Axis((23.50027011, 14.5, 10), (1, 0, 0)))

    # Mirror3: Revolve1 across plane
    add(revolve1.mirror(Plane(origin=(0, 0, 0), x_dir=(1, 0, 0), z_dir=(0, 0, -1))))

    # Fillet6: full round fillet: the end face becomes a half cylinder, R = half its width
    fillet6_face = Plane((23, 14.5, 0), x_dir=(0, 0, -1), z_dir=(-1, 0, 0))  # on the end face: x along it, z out of the body
    fillet6_slab = fillet6_face.offset(-FILLET6_RADIUS / 2) * Box(FILLET6_LENGTH, 2 * FILLET6_RADIUS, FILLET6_RADIUS, mode=Mode.PRIVATE)  # the body's end, R deep
    fillet6_round = Plane((24.5, 14.5, 0), x_dir=(-1, 0, 0), z_dir=(0, 0, -1)) * Cylinder(FILLET6_RADIUS, FILLET6_LENGTH, mode=Mode.PRIVATE)  # its axis R under the face
    add(fillet6_slab - fillet6_round, mode=Mode.SUBTRACT)

    # Fillet7
    fillet7_edges = [part.edges().sort_by_distance(p)[0] for p in [
        (-30, 16, 0),
    ]]
    fillet(fillet7_edges, radius=FILLET7_R)

    # Fillet8
    fillet8_edges = [part.edges().sort_by_distance(p)[0] for p in [
        (1, 16, -40),
        (-30, 7, -40),
        (-29.414213562, 15.414213562, -40),
    ]]
    fillet(fillet8_edges, radius=FILLET8_R)

    # Fillet9
    fillet9_edges = [part.edges().sort_by_distance(p)[0] for p in [
        (30, 16, 1),
        (30, 7, -40),
        (30, 15.414213562, -39.414213562),
    ]]
    fillet(fillet9_edges, radius=FILLET9_R)

    # Fillet10
    fillet10_edges = [part.edges().sort_by_distance(p)[0] for p in [
        (0, 16, 40),
        (-30, 7, 40),
        (-29.414213562, 15.414213562, 40),
        (30, 7, 40),
        (29.414213562, 15.414213562, 40),
    ]]
    fillet(fillet10_edges, radius=FILLET10_R)

    # Fillet11
    fillet11_edges = [part.edges().sort_by_distance(p)[0] for p in [
        (0, 0, -40),
        (-30, 0, 0),
        (-29.414213562, 0, -39.414213562),
        (30, 0, 0),
        (29.414213562, 0, -39.414213562),
        (0, 0, 40),
        (29.414213562, 0, 39.414213562),
        (-29.414213562, 0, 39.414213562),
    ]]
    fillet(fillet11_edges, radius=FILLET11_R)


solid = part.part
